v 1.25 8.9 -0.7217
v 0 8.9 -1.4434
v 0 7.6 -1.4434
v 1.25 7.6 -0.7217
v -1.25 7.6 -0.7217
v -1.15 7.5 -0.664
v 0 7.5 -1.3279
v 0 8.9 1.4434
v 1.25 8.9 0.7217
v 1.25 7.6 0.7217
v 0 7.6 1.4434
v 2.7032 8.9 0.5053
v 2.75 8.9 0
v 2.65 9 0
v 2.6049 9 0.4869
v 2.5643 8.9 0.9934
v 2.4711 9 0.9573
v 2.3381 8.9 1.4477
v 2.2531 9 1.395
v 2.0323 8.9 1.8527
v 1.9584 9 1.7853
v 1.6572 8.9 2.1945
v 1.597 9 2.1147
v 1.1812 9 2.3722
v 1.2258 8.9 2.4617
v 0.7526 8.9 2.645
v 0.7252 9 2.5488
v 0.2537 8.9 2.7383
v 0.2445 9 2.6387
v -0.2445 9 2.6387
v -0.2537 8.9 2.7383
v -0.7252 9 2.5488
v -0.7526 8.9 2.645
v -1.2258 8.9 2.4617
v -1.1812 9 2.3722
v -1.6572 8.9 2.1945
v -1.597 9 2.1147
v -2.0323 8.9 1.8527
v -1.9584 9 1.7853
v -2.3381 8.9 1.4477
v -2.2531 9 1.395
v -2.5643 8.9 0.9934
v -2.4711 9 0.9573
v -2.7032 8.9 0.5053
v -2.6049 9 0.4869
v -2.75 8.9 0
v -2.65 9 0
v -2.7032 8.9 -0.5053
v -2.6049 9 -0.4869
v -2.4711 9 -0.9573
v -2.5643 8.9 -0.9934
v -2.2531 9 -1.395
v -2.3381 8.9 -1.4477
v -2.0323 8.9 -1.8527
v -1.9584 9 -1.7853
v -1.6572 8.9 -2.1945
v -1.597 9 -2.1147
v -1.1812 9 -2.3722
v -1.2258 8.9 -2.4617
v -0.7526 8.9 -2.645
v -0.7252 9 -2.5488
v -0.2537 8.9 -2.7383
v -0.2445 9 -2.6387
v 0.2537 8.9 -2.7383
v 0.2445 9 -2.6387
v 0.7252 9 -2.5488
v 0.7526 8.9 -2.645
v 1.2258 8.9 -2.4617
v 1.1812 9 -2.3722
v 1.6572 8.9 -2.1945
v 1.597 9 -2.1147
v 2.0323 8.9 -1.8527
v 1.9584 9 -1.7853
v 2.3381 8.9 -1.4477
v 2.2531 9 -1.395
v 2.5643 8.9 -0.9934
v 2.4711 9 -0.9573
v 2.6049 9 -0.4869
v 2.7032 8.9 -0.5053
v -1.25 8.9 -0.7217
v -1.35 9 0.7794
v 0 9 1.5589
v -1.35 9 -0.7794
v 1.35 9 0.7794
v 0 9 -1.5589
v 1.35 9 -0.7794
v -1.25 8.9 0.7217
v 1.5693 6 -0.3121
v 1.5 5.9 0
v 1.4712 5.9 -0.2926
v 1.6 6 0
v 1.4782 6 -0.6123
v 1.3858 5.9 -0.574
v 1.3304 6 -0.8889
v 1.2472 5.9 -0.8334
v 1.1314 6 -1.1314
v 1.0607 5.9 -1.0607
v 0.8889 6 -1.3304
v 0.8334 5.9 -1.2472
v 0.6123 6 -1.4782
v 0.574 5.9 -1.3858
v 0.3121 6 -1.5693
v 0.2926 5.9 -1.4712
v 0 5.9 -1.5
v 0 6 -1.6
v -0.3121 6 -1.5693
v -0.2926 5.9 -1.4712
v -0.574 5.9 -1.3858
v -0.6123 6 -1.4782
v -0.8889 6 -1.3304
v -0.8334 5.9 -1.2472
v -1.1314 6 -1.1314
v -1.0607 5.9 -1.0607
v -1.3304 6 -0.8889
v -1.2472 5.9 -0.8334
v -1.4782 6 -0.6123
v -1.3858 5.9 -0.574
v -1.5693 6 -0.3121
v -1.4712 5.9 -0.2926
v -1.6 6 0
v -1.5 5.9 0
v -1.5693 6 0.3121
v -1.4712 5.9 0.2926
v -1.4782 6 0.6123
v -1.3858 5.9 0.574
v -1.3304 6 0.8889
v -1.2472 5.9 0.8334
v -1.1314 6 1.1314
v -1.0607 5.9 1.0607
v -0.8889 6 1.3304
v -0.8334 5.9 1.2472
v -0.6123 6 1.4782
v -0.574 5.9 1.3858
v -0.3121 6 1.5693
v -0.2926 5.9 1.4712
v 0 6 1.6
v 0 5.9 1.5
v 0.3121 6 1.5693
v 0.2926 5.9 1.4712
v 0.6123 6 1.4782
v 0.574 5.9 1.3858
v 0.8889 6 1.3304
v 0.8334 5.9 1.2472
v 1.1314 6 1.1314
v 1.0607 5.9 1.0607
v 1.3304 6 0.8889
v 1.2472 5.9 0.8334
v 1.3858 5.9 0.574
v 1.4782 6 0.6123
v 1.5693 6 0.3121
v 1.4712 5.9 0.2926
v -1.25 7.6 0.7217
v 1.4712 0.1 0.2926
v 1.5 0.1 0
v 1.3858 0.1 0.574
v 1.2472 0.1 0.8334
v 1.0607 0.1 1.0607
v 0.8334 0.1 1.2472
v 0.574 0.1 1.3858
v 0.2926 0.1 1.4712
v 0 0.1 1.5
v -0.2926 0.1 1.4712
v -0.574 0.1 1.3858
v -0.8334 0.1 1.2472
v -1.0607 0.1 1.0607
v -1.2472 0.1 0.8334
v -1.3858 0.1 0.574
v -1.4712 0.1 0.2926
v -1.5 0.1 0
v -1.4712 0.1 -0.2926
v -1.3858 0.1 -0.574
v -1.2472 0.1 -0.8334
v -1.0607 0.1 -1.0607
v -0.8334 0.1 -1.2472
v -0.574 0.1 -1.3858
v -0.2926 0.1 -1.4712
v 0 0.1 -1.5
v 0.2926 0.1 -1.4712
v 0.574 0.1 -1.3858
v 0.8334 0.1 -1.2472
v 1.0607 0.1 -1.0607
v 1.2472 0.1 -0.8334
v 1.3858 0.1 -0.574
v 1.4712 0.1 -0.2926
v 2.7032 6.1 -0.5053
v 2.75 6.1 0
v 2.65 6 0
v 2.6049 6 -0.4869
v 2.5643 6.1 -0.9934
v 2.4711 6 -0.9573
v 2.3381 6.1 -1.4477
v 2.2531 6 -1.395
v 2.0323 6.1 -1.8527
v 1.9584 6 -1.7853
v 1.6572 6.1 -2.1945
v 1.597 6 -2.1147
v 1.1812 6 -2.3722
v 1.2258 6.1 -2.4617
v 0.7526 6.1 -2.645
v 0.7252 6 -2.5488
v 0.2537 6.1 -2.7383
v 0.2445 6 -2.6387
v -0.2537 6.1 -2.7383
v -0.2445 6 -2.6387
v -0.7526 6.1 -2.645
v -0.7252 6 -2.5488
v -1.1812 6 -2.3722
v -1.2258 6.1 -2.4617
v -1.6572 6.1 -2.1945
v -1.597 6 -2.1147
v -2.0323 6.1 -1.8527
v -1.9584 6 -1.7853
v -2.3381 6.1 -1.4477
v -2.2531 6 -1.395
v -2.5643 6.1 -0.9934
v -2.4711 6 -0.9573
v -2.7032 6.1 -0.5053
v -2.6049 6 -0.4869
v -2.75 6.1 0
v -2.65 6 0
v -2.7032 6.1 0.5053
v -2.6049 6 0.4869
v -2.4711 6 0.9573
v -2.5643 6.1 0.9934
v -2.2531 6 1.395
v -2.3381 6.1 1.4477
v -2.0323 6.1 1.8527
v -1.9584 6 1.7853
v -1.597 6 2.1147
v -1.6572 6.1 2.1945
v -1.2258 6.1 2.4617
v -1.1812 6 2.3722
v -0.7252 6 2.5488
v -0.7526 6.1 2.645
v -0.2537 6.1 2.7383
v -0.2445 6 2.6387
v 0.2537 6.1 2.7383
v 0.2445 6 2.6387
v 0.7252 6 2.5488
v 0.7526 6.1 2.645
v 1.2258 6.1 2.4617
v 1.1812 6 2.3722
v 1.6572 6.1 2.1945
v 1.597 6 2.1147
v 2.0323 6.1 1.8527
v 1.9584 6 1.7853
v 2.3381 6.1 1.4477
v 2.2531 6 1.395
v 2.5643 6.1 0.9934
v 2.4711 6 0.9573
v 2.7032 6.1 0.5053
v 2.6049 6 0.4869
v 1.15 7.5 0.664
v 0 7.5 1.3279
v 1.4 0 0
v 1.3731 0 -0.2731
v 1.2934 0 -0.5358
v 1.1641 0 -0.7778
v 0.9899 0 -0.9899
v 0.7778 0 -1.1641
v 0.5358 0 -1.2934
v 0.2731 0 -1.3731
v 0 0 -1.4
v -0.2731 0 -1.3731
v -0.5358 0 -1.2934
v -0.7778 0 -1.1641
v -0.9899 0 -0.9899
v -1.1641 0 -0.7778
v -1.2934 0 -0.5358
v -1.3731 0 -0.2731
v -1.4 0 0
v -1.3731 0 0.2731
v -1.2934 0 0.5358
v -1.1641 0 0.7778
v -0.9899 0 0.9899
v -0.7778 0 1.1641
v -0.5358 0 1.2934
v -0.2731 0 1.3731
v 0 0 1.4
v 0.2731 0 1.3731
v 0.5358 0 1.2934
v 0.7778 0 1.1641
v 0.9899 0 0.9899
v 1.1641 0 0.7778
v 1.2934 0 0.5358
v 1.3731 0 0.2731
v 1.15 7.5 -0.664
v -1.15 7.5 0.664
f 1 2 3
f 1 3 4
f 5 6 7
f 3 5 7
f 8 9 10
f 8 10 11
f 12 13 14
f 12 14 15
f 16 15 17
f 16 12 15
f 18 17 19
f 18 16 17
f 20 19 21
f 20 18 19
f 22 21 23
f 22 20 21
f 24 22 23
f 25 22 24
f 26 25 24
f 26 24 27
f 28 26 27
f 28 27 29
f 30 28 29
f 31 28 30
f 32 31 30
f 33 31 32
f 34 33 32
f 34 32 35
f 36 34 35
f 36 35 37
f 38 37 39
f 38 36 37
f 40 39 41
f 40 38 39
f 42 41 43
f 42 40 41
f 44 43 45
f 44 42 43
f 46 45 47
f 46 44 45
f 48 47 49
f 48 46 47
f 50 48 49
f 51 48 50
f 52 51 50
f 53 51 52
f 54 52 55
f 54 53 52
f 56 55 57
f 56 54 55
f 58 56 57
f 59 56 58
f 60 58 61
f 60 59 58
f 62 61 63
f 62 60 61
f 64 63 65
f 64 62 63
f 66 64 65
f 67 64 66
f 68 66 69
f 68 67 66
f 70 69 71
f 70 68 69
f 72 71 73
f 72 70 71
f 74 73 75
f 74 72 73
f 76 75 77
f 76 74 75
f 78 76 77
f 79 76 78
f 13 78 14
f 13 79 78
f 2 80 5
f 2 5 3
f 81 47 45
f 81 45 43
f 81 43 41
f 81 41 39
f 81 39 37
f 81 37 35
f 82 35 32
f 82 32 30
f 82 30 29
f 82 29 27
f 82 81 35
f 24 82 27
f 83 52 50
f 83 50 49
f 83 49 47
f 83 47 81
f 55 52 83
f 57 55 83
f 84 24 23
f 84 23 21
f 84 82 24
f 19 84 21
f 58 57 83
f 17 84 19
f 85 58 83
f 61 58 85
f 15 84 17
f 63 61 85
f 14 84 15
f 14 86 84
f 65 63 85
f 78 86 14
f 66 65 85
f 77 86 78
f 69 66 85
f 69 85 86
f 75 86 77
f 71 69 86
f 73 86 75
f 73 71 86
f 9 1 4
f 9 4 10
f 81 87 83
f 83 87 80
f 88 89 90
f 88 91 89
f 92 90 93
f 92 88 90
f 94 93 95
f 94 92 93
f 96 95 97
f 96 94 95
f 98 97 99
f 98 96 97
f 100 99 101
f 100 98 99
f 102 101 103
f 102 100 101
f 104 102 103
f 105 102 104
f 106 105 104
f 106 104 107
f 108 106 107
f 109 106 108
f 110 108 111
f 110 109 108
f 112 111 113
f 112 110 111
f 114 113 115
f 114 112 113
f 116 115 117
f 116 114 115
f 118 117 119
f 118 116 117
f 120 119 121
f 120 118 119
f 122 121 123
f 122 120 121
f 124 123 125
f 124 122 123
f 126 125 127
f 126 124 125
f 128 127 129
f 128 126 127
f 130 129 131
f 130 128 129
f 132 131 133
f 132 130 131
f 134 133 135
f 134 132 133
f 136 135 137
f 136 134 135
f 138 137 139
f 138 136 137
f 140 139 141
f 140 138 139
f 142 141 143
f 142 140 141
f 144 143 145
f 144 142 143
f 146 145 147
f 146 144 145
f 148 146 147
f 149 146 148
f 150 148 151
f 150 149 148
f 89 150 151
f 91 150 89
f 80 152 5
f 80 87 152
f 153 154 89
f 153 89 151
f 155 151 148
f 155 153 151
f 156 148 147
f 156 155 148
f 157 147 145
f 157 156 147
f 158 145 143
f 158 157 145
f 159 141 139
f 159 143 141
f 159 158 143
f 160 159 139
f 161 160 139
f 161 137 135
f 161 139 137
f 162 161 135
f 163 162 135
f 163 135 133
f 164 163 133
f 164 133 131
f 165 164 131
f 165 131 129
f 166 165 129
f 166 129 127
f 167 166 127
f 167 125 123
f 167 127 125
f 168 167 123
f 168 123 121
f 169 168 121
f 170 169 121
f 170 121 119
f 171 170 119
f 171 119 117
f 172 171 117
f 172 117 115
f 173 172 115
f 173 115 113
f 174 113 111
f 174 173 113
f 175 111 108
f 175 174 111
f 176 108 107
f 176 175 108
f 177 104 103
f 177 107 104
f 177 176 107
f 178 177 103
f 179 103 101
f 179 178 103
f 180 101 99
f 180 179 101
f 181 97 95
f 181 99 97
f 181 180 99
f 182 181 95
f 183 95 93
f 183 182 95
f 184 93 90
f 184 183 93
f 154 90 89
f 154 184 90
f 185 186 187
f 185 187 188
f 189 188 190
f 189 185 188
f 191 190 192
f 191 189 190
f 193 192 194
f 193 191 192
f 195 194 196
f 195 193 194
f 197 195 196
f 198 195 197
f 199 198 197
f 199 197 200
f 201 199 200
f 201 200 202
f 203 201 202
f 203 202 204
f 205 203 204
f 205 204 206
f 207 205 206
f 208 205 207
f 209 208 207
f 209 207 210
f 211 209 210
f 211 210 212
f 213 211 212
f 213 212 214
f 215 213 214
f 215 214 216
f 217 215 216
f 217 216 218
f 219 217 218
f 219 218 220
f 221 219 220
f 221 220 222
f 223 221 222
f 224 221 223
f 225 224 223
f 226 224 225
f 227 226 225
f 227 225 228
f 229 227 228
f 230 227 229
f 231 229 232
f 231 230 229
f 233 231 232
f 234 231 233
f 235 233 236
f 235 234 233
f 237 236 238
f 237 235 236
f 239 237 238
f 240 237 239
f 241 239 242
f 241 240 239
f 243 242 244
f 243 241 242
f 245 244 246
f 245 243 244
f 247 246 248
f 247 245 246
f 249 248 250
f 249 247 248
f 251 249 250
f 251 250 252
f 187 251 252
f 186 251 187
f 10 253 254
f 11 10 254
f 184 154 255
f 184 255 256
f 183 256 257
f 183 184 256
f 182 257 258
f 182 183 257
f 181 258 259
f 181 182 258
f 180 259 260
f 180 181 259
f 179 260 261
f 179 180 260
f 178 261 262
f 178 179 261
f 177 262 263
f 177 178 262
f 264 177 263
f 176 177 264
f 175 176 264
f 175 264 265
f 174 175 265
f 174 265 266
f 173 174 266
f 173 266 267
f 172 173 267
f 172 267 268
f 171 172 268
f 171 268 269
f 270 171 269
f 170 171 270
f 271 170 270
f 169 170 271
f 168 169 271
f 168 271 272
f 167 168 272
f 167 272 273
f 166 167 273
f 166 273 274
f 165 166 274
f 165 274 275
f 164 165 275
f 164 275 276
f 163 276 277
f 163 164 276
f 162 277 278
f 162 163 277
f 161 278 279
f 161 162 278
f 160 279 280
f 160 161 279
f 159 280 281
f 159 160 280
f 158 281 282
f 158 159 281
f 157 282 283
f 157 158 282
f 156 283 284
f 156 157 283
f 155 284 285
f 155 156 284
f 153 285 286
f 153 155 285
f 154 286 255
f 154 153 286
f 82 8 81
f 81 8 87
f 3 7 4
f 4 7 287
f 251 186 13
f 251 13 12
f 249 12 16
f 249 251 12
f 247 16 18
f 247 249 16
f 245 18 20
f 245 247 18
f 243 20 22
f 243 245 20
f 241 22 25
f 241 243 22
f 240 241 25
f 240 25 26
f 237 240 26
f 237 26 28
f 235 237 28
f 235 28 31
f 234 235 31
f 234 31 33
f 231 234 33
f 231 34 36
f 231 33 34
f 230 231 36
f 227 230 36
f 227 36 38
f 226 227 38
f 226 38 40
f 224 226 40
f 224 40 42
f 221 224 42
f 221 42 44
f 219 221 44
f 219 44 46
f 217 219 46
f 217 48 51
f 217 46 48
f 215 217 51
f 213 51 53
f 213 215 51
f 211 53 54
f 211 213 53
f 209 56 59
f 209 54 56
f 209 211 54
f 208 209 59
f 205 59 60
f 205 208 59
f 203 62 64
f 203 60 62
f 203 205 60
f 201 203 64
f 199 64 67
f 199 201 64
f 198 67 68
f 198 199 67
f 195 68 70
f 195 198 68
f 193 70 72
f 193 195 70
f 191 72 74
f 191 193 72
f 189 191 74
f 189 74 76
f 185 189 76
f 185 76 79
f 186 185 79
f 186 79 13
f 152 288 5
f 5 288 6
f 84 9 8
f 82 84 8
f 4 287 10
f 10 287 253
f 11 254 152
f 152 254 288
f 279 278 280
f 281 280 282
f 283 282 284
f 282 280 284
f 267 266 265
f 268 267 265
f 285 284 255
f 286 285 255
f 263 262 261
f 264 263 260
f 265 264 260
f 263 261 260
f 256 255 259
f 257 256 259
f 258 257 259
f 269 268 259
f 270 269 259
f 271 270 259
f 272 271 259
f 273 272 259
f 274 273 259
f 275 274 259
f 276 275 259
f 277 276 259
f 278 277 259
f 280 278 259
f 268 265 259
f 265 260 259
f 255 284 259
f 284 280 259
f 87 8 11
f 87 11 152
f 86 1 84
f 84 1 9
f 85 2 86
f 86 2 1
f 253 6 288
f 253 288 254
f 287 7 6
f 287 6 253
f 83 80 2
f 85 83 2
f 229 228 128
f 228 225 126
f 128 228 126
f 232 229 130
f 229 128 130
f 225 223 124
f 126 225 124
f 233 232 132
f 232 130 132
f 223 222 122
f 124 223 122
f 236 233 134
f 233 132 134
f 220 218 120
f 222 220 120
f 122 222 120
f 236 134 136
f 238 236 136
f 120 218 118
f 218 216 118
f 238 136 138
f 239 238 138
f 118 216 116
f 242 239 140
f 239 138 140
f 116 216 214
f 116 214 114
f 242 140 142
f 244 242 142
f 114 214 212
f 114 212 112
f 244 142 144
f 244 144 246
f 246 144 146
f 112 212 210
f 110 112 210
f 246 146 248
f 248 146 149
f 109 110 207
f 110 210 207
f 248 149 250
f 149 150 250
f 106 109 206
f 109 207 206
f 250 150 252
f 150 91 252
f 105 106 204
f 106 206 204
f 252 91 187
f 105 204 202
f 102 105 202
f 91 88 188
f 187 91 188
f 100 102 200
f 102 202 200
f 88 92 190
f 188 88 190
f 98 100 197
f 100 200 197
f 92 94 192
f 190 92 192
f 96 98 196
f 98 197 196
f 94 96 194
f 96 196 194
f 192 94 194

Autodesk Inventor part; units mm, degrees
ref_plane "YZ Plane" through (0, 0, 0) normal (1, 0, 0) x (0, 1, 0)
ref_plane "XZ Plane" through (0, 0, 0) normal (0, 1, 0) x (-1, 0, 0)
ref_plane "XY Plane" through (0, 0, 0) normal (0, 0, 1) x (1, 0, 0)
sketch "Sketch1" plane through (0, 0, 0) normal (0, 0, 1) x (1, 0, 0)
  line L0 (0, 9) -> (2.75, 9)
  line L1 (2.75, 9) -> (2.75, 6)
  line L2 (2.75, 6) -> (1.5, 6)
  line L3 (1.5, 6) -> (1.5, 0)
  line L4 (1.5, 0) -> (0, 0)
  line L5 (0, 0) -> (0, 9)
  dimension "d0" = 2.75
  dimension "d1" = 3
  dimension "d2" = 6
  dimension "d3" = 1.5
revolve "Revolution1" add sketch "Sketch1" angle 360 about axis through (0, 0, 0) along (0, 1, 0)
thread "Thread1" size "M3x0.5" class "6g" standard "ANSI Metric M Profile" full length
sketch "Sketch3" plane through (0, 9, 0) normal (0, 1, 0) x (1, 0, 0)
  line L0 (1.25, -0.7217) -> (0, -1.4434)
  line L1 (0, -1.4434) -> (-1.25, -0.7217)
  line L2 (-1.25, -0.7217) -> (-1.25, 0.7217)
  line L3 (-1.25, 0.7217) -> (0, 1.4434)
  line L4 (0, 1.4434) -> (1.25, 0.7217)
  line L5 (1.25, 0.7217) -> (1.25, -0.7217)
  point P0 (0, 0)
  point P1 (0, 0)
  dimension "d13" = 2.5
extrude "Extrusion2" cut sketch "Sketch3" against normal blind 1.5
chamfer "Chamfer2" distance 0.1 angle 45 16 edges at (0.625, 9, 1.0825) (1.25, 9, 0) (1.25, 7.5, 0) (0.625, 9, -1.0825) (0.625, 7.5, -1.0825) (-0.625, 9, -1.0825) (-0.625, 7.5, -1.0825) (-1.25, 7.5, 0) (-1.25, 9, 0) (-0.625, 7.5, 1.0825) (-0.625, 9, 1.0825) (0.625, 7.5, 1.0825) (-2.75, 9, 0) (-2.75, 6, 0) (-1.5, 6, 0) (-1.5, 0, 0)
properties part number "M3 X 6"
